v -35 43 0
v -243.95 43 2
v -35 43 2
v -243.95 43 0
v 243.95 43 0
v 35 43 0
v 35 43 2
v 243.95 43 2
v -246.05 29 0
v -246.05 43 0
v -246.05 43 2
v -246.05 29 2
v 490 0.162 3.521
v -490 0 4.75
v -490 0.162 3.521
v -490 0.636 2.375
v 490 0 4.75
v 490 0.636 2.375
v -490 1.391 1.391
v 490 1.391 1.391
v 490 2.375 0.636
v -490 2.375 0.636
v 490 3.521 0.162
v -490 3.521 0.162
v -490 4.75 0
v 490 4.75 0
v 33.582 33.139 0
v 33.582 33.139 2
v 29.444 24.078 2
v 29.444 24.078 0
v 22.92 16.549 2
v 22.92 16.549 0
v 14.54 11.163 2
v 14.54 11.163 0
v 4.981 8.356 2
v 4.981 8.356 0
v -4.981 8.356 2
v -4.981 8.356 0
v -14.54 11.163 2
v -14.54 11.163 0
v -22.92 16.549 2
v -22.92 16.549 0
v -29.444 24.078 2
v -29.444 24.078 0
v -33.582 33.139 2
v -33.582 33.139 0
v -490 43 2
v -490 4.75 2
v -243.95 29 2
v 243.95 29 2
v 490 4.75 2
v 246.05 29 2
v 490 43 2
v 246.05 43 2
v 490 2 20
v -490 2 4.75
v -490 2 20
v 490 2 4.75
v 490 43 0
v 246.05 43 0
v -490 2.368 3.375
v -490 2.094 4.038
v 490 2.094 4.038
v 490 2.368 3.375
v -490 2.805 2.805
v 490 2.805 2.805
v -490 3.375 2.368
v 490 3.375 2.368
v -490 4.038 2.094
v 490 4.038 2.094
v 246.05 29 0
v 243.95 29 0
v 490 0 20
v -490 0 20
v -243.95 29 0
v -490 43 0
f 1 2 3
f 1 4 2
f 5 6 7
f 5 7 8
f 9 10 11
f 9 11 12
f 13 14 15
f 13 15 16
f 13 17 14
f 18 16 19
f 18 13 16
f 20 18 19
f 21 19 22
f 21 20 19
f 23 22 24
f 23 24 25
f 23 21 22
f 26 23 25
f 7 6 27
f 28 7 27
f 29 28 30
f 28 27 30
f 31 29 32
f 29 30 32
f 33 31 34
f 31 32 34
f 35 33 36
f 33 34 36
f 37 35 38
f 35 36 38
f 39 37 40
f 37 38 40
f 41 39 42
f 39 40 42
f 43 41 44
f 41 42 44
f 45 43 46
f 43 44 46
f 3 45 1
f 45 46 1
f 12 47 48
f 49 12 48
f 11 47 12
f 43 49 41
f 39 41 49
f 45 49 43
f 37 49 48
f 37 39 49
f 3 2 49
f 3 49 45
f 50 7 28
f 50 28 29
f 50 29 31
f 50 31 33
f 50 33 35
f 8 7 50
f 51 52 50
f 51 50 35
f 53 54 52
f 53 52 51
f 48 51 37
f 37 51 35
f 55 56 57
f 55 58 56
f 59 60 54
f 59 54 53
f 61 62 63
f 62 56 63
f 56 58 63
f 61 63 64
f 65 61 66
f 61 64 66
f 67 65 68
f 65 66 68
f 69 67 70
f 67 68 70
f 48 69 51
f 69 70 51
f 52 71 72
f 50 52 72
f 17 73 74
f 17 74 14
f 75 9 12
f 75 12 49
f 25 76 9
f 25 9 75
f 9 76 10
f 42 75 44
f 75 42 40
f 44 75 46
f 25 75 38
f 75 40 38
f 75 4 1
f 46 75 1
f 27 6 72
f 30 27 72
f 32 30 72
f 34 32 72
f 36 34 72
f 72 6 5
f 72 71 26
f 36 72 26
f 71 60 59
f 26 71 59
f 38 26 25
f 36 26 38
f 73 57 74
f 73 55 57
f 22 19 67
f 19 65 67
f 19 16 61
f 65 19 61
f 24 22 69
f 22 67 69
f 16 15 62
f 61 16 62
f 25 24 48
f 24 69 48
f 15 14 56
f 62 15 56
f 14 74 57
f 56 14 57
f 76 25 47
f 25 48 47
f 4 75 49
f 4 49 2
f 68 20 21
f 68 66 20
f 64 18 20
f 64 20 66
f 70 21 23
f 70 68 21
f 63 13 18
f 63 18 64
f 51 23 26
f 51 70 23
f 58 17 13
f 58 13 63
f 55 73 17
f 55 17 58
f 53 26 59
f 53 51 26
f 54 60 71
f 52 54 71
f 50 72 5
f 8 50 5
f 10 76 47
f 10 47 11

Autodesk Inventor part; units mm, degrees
ref_plane "YZ Plane" through (0, 0, 0) normal (1, 0, 0) x (0, 1, 0)
ref_plane "XZ Plane" through (0, 0, 0) normal (0, 1, 0) x (-1, 0, 0)
ref_plane "XY Plane" through (0, 0, 0) normal (0, 0, 1) x (1, 0, 0)
sketch "Sketch1" plane through (0, 0, 0) normal (0, 0, 1) x (1, 0, 0)
  line L0 (-490, 43) -> (490, 43)
  line L1 (490, 43) -> (490, 0)
  line L2 (490, 0) -> (-490, 0)
  line L3 (-490, 0) -> (-490, 43)
  point P0 (0, 0)
  point P1 (0, 0)
  dimension "d0" = 980
  dimension "d1" = 43
extrude "Plate1" add sketch "Sketch1" along normal blind 2
sketch "Sketch2" plane through (490, 2, 0) normal (0, -1, 0) x (1, 0, 0)
  line L0 (-980, 0) -> (0, 0)
  line L1 (0, 0) -> (0, 20)
  line L2 (0, 20) -> (-980, 20)
  line L3 (-980, 20) -> (-980, 0)
edge flange "Flange1" height 20 angle 90 thickness 2 bend radius 2.75 thickness toward (0, -1, 0) relief round relief width 2 relief depth 1 edges at (0, 0, 2) wall of the first edge with corners at (-490, 2, 0) (490, 2, 0) (490, 2, 20) (-490, 2, 20)
bend "Bend1"
corner "Corner1"
sketch "Sketch5" plane through (0, 0, 0) normal (0, 0, -1) x (-1, 0, 0)
  line L0 (490, 43) -> (-490, 43) projected
  line L1 (490, 0) -> (-490, 0) projected
  circle A0 centre (0, 43) radius 35
  line L2 (243.95, 43) -> (246.05, 43)
  line L3 (246.05, 43) -> (246.05, 29)
  line L4 (246.05, 29) -> (243.95, 29)
  line L5 (243.95, 29) -> (243.95, 43)
  line L6 (-243.95, 43) -> (-246.05, 43)
  line L7 (-246.05, 43) -> (-246.05, 29)
  line L8 (-246.05, 29) -> (-243.95, 29)
  line L9 (-243.95, 29) -> (-243.95, 43)
  line L10 (0, 43) -> (0, 0) construction
  point P0 (0, 0)
  point P1 (245, 29)
  point P2 (-245, 29)
  point P3 (246.05, 43)
  point P4 (-35, 43)
  point P5 (35, 43)
  point P6 (-246.05, 43)
  dimension "d45" = 70
  dimension "d48" = 2.1
  dimension "d49" = 490
  dimension "d51" = 29
  dimension "d52" = 14
extrude "Extrusion1" cut sketch "Sketch5" against normal through all contours L3 L4 L5 L0 | L9 L8 L7 L0 | A0 L0 picked at (-5.9248, 24.8306)
sketch "Sketch9" plane through (0, 0, 2) normal (0, 0, 1) x (1, 0, 0)
  line L0 (485.6141, 29.596) -> (485.6141, 17.596) construction
  line L1 (485.6141, 17.596) -> (285.6141, 17.596) construction
  line L2 (285.6141, 17.596) -> (285.6141, 29.596) construction
  line L3 (285.6141, 29.596) -> (485.6141, 29.596) construction
  line L4 (-490, 43) -> (490, 43) projected
  point P0 (0, 0)
  point P1 (1.05, 68)
  point P2 (490, 43)
  dimension "d40" = 200
  dimension "d41" = 12
mark "Mark2"
equation "\"d2\" = Thickness"
equation "\"d3\" = BendReliefWidth"
equation "\"d4\" = BendReliefDepth"
equation "\"d5\" = MinimumRemnant"
equation "\"d6\" = TransitionRadius"
equation "\"d9\" = BendRadius"
equation "\"d10\" = CornerReliefSize"
equation "\"d11\" = GapSize"
equation "\"d12\" = JacobiRadiusSize"
equation "\"BendReliefWidth\" = Thickness"
equation "\"BendReliefDepth\" = 0.5 * Thickness"
equation "\"CornerReliefSize\" = 4 * Thickness"
equation "\"MinimumRemnant\" = 2 * Thickness"
equation "\"TransitionRadius\" = BendRadius"
equation "\"JacobiRadiusSize\" = BendRadius"
equation "\"GapSize\" = Thickness"
equation "\"Thickness\" = 2"
equation "\"BendRadius\" = 2.75"
properties part number "MSC 308 stringer BOARD  ###" material "Stainless Steel"
